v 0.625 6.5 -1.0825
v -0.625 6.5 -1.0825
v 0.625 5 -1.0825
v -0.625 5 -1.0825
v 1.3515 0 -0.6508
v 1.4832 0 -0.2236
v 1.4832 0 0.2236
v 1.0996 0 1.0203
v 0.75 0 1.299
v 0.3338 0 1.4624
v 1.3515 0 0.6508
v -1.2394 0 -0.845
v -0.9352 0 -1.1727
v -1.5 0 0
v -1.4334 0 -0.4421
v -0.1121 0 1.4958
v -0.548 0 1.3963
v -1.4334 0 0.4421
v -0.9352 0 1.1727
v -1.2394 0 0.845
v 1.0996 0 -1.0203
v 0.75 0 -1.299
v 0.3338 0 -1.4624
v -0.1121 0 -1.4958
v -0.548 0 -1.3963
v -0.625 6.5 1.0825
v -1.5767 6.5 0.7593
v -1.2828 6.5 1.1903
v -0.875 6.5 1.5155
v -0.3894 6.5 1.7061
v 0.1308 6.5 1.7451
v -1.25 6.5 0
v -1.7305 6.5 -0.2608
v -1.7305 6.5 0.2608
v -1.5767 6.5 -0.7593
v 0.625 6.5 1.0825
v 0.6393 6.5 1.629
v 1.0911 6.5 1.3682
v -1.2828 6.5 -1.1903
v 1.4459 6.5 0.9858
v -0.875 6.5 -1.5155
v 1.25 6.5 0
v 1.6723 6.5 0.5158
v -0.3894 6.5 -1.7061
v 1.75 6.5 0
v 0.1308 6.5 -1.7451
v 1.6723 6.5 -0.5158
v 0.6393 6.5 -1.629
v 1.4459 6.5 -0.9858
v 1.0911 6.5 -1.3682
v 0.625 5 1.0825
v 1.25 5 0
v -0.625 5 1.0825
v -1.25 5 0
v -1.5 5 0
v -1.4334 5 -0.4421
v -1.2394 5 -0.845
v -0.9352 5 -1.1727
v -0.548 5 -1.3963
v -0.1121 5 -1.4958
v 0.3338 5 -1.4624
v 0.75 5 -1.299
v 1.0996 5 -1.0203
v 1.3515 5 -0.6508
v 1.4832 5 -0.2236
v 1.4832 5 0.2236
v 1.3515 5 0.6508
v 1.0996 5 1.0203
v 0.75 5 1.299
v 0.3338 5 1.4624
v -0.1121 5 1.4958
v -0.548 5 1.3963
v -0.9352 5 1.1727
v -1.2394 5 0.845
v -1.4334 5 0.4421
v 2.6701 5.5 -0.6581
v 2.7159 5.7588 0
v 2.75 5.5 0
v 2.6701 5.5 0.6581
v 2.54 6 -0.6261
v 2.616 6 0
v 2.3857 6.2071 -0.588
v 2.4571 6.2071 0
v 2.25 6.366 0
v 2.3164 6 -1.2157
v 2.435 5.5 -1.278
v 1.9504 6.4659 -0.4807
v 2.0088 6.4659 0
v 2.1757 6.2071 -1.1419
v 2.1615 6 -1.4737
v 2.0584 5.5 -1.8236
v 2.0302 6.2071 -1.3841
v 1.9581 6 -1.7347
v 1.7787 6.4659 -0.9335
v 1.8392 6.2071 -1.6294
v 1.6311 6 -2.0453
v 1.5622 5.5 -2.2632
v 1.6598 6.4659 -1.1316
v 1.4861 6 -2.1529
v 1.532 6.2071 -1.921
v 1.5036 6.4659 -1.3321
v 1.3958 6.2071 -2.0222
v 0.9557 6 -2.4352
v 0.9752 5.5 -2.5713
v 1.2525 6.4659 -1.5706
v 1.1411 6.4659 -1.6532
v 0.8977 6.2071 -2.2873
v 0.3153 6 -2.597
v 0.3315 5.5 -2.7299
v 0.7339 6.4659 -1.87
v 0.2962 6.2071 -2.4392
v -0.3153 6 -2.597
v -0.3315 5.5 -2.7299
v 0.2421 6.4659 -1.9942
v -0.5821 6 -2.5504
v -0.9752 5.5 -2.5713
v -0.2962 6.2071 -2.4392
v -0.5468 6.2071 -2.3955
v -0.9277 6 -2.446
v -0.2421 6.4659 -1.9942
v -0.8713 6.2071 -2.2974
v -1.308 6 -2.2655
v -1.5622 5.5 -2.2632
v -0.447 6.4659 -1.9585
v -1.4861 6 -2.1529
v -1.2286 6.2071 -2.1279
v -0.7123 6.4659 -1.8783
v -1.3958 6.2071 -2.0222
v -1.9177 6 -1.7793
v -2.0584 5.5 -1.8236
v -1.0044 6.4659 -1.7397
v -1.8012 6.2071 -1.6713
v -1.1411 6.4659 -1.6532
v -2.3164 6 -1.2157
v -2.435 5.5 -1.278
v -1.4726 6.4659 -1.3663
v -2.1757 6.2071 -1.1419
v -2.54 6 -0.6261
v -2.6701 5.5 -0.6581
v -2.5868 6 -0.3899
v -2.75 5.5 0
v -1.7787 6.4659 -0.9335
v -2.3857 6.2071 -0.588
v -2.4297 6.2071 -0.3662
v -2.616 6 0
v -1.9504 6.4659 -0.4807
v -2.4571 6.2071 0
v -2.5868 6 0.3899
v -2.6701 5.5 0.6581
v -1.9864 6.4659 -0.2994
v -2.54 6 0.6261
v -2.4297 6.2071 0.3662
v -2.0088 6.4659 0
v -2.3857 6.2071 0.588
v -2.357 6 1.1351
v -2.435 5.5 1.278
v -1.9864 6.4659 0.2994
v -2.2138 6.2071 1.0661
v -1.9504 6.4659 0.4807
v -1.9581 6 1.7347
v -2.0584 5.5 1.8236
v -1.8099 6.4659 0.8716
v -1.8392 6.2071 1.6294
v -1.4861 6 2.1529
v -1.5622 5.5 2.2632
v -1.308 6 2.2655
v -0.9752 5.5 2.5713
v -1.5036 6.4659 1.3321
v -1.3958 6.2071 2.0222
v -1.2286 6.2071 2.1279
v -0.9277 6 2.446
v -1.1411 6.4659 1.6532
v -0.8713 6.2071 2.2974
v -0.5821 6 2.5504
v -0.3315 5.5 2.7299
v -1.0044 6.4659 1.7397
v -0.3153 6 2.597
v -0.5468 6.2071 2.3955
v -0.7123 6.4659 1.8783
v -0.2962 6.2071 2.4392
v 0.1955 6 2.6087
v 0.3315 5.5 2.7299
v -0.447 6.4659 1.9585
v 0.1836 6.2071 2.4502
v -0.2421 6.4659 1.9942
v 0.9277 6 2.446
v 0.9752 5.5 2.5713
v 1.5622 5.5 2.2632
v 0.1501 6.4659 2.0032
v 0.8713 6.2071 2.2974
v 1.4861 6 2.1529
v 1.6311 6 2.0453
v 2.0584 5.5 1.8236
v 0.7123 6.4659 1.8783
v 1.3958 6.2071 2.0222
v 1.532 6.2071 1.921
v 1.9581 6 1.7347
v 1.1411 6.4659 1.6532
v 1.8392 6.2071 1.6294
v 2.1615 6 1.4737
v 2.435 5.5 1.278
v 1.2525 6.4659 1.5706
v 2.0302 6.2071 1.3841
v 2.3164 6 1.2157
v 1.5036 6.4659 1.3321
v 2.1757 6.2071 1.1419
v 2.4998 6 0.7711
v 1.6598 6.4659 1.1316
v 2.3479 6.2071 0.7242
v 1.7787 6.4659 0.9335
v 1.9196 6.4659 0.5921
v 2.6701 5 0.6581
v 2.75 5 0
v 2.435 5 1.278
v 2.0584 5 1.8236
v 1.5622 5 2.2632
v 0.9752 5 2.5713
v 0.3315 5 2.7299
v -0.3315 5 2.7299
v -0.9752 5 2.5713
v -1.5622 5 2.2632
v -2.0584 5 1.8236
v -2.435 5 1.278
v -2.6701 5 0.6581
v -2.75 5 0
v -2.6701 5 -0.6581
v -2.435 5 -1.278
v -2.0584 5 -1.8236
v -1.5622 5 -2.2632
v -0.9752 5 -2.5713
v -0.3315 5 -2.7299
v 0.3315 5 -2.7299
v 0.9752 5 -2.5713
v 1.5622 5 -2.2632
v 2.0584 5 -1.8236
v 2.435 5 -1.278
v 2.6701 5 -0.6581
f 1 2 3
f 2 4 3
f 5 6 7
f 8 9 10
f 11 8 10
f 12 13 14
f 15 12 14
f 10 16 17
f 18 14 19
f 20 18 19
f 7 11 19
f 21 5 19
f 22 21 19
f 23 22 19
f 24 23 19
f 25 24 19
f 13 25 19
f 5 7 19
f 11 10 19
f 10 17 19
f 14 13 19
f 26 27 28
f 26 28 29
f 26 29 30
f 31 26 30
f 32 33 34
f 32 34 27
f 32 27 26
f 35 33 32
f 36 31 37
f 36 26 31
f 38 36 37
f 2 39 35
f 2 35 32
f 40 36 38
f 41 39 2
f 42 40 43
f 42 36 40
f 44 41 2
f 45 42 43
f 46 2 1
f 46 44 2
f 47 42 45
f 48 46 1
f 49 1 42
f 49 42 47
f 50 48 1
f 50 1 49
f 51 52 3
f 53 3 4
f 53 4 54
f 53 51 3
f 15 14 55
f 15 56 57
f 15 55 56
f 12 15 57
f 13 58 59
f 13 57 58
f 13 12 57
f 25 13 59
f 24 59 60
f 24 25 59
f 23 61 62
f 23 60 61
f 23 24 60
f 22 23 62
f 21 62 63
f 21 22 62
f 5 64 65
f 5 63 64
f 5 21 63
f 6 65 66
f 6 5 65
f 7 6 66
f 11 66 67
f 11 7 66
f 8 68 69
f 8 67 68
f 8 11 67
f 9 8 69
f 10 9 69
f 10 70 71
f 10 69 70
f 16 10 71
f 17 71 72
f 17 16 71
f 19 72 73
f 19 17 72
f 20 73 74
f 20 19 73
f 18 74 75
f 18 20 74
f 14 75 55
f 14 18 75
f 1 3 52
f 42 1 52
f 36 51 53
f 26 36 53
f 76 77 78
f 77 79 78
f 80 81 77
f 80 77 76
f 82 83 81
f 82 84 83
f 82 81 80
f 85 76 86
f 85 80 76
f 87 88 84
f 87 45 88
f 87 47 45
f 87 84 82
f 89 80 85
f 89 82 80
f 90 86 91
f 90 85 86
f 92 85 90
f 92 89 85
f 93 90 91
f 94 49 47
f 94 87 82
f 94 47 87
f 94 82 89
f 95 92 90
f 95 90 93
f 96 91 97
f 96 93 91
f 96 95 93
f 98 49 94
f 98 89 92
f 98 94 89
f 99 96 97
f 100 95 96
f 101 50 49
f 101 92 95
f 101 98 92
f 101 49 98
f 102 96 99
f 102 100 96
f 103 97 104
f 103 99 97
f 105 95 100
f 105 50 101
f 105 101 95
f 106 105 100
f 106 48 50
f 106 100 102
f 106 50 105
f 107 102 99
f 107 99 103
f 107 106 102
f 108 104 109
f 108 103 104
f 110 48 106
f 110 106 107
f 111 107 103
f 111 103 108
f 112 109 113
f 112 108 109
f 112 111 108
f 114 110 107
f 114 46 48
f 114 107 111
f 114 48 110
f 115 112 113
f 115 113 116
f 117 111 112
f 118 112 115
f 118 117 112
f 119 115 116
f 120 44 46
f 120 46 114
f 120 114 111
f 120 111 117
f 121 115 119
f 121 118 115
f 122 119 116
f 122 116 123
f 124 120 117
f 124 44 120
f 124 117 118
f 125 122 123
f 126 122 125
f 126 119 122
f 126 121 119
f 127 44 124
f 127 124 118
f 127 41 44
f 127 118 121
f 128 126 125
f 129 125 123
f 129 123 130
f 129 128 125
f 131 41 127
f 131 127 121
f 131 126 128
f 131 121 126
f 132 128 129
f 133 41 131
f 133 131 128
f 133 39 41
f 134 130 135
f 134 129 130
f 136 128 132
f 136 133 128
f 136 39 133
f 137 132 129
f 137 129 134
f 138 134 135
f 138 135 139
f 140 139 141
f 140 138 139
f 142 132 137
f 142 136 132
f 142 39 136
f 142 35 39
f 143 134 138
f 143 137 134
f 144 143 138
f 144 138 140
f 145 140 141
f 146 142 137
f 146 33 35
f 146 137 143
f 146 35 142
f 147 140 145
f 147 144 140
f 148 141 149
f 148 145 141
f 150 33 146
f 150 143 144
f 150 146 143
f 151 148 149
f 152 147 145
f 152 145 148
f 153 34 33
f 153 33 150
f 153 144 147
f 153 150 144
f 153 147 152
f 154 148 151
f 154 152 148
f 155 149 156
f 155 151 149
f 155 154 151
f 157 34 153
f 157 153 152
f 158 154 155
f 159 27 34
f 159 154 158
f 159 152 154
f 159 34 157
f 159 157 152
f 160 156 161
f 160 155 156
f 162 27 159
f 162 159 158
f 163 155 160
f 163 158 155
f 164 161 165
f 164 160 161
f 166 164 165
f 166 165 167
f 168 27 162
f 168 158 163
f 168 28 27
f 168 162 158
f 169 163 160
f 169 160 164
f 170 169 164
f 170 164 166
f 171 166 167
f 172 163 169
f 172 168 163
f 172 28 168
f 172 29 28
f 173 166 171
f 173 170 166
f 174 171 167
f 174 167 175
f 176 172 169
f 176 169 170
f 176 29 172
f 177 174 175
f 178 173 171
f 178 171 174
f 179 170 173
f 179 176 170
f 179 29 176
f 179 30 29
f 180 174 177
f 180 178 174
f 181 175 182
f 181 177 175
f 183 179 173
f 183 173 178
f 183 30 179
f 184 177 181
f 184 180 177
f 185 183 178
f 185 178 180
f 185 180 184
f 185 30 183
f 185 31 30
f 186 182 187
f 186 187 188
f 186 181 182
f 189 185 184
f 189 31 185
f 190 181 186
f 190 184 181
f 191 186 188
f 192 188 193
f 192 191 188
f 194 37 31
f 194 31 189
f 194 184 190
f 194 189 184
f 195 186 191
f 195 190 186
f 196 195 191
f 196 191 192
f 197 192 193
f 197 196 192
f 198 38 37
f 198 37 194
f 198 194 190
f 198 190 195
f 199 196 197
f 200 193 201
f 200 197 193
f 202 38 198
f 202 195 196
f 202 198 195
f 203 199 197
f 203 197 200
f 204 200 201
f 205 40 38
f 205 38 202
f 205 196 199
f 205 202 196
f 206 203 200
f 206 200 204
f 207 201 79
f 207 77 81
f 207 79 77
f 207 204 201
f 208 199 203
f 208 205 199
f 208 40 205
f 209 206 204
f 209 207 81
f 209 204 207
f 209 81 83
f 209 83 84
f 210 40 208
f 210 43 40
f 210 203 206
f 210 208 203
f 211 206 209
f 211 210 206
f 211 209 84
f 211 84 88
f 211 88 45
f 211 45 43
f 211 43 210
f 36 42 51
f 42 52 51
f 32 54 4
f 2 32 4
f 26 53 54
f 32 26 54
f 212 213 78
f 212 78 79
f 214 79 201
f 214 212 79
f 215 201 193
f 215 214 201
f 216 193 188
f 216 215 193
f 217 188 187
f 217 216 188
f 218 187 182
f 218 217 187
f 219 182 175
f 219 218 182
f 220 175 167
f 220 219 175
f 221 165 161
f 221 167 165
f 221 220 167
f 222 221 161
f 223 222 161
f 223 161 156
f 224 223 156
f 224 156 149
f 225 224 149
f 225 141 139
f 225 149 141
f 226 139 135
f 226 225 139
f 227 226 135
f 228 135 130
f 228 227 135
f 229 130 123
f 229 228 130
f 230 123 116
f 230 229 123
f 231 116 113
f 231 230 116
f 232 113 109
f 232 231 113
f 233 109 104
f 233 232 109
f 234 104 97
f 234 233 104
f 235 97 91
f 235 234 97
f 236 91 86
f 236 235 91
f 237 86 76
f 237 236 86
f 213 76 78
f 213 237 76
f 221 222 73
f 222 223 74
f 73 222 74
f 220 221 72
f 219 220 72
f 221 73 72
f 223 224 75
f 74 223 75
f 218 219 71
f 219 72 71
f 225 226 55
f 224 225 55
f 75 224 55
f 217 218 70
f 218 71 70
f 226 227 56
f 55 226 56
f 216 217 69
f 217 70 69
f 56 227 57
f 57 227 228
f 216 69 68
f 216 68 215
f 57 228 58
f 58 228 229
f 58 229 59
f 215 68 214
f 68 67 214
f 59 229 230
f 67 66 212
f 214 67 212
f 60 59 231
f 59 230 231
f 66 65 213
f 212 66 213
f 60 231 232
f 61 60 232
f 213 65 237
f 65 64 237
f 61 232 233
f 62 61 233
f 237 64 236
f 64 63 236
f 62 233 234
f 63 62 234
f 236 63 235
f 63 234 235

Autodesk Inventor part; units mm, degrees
ref_plane "YZ Plane" through (0, 0, 0) normal (1, 0, 0) x (0, 1, 0)
ref_plane "XZ Plane" through (0, 0, 0) normal (0, 1, 0) x (-1, 0, 0)
ref_plane "XY Plane" through (0, 0, 0) normal (0, 0, 1) x (1, 0, 0)
sketch "Sketch1" plane through (0, 0, 0) normal (0, 1, 0) x (-1, 0, 0)
  circle A0 centre (0, 0) radius 1.5
  dimension "d0" = 3
extrude "Extrusion1" add sketch "Sketch1" along normal blind 5
sketch "Sketch2" plane through (0, 5, 0) normal (0, 1, 0) x (1, 0, 0)
  circle A0 centre (0, 0) radius 1.25 construction
  line L0 (-1.25, 0) -> (-0.625, 1.0825)
  line L1 (-0.625, 1.0825) -> (0.625, 1.0825)
  line L2 (0.625, 1.0825) -> (1.25, 0)
  line L3 (1.25, 0) -> (0.625, -1.0825)
  line L4 (0.625, -1.0825) -> (-0.625, -1.0825)
  line L5 (-0.625, -1.0825) -> (-1.25, 0)
  circle A1 centre (0, 0) radius 2.75
  dimension "d3" = 2.5
  dimension "d4" = 5.5
extrude "Extrusion2" add sketch "Sketch2" along normal blind 1.5
fillet "Fillet1" radius 1 1 edges at (-2.75, 6.5, 0)
thread "Thread1" size "M3x0.5" class "6g" standard "ANSI Metric M Profile" full length
properties part number "4mmScrew"
